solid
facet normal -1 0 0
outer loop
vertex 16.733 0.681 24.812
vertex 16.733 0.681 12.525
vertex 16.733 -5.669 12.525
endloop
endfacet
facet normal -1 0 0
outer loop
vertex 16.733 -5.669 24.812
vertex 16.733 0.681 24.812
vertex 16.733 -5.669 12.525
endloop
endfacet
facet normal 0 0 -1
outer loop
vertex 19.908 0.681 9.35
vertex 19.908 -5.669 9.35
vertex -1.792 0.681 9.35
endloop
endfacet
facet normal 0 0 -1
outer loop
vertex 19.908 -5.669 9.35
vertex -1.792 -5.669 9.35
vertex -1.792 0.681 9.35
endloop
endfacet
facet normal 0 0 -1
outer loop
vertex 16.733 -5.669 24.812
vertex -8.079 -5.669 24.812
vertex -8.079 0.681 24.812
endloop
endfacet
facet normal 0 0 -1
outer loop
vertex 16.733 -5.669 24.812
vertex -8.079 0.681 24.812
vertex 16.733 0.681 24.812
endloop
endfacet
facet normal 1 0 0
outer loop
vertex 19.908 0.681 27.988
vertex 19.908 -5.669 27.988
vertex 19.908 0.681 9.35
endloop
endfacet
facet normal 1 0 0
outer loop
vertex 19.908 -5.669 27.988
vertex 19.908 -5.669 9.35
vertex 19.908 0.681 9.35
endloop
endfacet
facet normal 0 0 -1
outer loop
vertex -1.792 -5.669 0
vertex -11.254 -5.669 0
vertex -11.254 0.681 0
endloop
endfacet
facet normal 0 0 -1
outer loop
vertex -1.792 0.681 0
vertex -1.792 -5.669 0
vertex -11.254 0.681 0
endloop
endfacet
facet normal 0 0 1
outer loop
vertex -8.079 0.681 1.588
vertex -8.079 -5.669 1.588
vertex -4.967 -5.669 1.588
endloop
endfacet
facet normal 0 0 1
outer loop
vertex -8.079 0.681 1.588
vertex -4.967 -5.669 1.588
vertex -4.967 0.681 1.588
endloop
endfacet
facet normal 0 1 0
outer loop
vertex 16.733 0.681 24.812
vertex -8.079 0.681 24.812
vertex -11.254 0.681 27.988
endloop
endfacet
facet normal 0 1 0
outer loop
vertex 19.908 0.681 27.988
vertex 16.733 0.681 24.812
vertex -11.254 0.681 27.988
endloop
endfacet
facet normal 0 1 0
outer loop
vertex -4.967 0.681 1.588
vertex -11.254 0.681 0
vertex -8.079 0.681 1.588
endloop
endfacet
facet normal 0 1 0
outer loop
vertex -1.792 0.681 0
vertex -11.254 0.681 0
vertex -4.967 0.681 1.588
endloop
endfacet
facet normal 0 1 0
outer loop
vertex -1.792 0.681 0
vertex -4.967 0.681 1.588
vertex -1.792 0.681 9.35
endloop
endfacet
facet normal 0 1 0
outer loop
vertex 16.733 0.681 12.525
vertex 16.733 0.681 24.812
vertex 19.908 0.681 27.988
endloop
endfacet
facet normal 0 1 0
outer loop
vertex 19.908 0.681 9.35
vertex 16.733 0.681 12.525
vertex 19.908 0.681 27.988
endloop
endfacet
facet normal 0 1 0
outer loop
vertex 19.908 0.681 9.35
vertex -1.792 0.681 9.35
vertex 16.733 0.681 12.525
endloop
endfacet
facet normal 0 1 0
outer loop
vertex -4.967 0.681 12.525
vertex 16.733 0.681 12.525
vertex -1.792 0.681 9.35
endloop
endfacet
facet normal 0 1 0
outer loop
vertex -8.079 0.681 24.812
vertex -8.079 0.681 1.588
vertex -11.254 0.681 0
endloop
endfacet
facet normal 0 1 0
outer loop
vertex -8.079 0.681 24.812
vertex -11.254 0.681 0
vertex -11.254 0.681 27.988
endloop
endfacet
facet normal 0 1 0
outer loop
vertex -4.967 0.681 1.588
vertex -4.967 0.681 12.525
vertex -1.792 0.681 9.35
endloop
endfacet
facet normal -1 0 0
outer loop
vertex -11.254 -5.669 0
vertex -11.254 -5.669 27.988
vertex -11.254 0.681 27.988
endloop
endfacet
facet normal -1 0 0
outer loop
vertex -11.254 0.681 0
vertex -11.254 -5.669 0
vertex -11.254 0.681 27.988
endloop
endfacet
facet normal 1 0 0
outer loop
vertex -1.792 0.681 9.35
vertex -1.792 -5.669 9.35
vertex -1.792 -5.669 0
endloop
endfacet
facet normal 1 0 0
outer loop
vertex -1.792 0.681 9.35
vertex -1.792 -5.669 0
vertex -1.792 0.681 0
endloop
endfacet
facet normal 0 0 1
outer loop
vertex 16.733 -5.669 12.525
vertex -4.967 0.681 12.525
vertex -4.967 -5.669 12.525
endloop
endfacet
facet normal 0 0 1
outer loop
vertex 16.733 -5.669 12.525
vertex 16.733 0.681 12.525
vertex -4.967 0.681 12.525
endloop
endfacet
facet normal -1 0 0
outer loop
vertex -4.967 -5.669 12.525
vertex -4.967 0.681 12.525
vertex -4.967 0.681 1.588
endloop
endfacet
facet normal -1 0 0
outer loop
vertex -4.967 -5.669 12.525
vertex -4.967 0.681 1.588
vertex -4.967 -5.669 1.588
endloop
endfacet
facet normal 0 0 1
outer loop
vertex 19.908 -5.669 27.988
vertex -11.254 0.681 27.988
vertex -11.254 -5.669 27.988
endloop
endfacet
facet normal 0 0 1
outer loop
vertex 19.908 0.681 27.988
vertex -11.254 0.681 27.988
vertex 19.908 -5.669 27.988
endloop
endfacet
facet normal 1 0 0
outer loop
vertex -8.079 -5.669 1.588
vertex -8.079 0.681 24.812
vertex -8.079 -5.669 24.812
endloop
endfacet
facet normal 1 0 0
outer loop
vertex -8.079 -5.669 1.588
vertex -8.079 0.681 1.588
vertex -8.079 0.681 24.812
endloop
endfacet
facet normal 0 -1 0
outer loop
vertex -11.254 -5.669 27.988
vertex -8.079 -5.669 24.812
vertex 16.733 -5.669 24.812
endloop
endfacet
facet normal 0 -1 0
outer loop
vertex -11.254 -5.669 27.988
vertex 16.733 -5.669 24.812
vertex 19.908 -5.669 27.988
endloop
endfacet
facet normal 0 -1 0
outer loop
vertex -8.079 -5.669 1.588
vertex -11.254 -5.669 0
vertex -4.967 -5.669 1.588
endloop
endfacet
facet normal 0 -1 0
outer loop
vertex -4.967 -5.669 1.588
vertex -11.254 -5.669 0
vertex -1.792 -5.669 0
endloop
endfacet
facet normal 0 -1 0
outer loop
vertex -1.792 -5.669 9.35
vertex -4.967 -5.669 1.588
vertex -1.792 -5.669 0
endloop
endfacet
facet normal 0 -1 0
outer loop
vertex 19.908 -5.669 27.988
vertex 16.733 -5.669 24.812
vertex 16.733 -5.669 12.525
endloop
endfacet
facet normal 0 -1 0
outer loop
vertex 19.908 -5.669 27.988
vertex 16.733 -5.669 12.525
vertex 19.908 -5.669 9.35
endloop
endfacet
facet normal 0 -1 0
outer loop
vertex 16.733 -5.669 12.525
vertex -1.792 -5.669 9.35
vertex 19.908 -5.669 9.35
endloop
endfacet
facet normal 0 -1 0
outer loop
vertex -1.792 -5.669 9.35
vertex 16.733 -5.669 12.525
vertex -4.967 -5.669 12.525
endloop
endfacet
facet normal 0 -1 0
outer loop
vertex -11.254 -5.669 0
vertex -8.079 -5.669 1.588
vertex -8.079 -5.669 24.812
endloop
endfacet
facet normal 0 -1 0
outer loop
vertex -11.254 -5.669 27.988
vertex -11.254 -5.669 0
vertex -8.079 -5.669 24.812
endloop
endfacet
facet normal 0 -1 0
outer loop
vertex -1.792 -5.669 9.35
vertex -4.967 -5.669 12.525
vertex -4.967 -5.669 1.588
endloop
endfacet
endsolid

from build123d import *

# Parameters (mm, degrees)
F0_W      = 30.1625
F0_H      = 6.35
F1_DEPTH  = 26.9875
F3_DEPTH  = 6.351
F4_W      = 12.7
F4_H      = 6.35
F5_DEPTH  = 6.351
F6_W      = 6.35
F6_H      = 1.5875
F7_DEPTH  = 7.9375
F8_W      = 12.7
F8_H      = 6.35
F9_DEPTH  = 3
F10_W     = 12.7
F10_H     = 6.35
F11_DEPTH = 3
F12_W     = 6.35
F12_H     = 10.9375
F13_DEPTH = 8
F14_W     = 6.35
F14_H     = 9.35
F15_DEPTH = 8
F16_W     = 6.35
F16_H     = 17.6375
F17_DEPTH = 1
F18_W     = 6.35
F18_H     = 11.2875
F19_DEPTH = 1
F20_W     = 24.8125
F20_H     = 6.35
F21_DEPTH = 1
F22_W     = 31.1625
F22_H     = 6.35
F23_DEPTH = 1


with BuildPart() as f1:
    # F0 (on Top) → F1 (new body)
    with BuildSketch(Plane.XY):
        with Locations((3.826838, -2.493716)):
            Rectangle(F0_W, F0_H)
    extrude(amount=F1_DEPTH)

    # F2 (on face) → F3 (cut, through all)
    with BuildSketch(Plane.XZ.offset(5.668716)):
        Polygon((15.733088, 9.525), (15.733088, 23.8125), (-8.079412, 23.8125), (-8.079412, 1.5875), (-4.904412, 1.5875), (-4.904412, 0), (3.033088, 0), (3.033088, 9.525), align=None)
    extrude(amount=-F3_DEPTH, mode=Mode.SUBTRACT)

    # F4 (on face) → F5 (cut, through all)
    with BuildSketch(Plane.XZ.offset(5.668716)):
        with Locations((12.558088, 3.175)):
            Rectangle(F4_W, F4_H)
    extrude(amount=-F5_DEPTH, mode=Mode.SUBTRACT)

    # F6 (on face) → F7 (join)
    with BuildSketch(Plane.YZ.offset(-4.904412)):
        with Locations((-2.493716, 0.79375)):
            Rectangle(F6_W, F6_H)
    extrude(amount=F7_DEPTH)

    # F8 (on face) → F9 (join)
    with BuildSketch(Plane.XY.offset(9.525)):
        with Locations((9.383088, -2.493716)):
            Rectangle(F8_W, F8_H)
    extrude(amount=F9_DEPTH)

    # F10 (on face) → F11 (cut)
    with BuildSketch(Plane(origin=(0, 0, 6.35), x_dir=(1, 0, 0), z_dir=(0, 0, -1))):
        with Locations((12.558088, 2.493716)):
            Rectangle(F10_W, F10_H)
    extrude(amount=-F11_DEPTH, mode=Mode.SUBTRACT)

    # F12 (on face) → F13 (join)
    with BuildSketch(Plane(origin=(3.033088, 0, 0), x_dir=(0, -1, 0), z_dir=(-1, 0, 0))):
        with Locations((2.493716, 7.05625)):
            Rectangle(F12_W, F12_H)
    extrude(amount=F13_DEPTH)

    # F14 (on face) → F15 (cut)
    with BuildSketch(Plane.YZ.offset(6.208088)):
        with Locations((-2.493716, 4.675)):
            Rectangle(F14_W, F14_H)
    extrude(amount=-F15_DEPTH, mode=Mode.SUBTRACT)

    # F16 (on face) → F17 (join)
    with BuildSketch(Plane.YZ.offset(18.908088)):
        with Locations((-2.493716, 18.16875)):
            Rectangle(F16_W, F16_H)
    extrude(amount=F17_DEPTH)

    # F18 (on face) → F19 (cut)
    with BuildSketch(Plane(origin=(15.733088, 0, 0), x_dir=(0, -1, 0), z_dir=(-1, 0, 0))):
        with Locations((2.493716, 18.16875)):
            Rectangle(F18_W, F18_H)
    extrude(amount=-F19_DEPTH, mode=Mode.SUBTRACT)

    # F20 (on face) → F21 (cut)
    with BuildSketch(Plane(origin=(0, 0, 23.8125), x_dir=(1, 0, 0), z_dir=(0, 0, -1))):
        with Locations((4.326838, 2.493716)):
            Rectangle(F20_W, F20_H)
    extrude(amount=-F21_DEPTH, mode=Mode.SUBTRACT)

    # F22 (on face) → F23 (join)
    with BuildSketch(Plane.XY.offset(26.9875)):
        with Locations((4.326838, -2.493716)):
            Rectangle(F22_W, F22_H)
    extrude(amount=F23_DEPTH)


solid = f1.part
